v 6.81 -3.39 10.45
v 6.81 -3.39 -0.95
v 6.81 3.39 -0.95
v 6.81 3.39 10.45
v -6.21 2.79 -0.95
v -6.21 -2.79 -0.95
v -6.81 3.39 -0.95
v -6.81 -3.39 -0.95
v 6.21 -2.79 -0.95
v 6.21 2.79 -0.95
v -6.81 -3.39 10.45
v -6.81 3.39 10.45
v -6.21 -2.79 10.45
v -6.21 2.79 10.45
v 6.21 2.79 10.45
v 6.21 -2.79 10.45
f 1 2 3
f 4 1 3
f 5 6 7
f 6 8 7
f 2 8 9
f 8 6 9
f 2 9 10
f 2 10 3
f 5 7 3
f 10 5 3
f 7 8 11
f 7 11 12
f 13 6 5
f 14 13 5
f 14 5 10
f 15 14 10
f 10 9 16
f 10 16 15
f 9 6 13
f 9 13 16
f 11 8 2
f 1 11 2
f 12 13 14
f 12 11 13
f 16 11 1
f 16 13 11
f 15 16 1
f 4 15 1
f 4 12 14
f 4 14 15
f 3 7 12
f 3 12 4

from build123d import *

# Parameters (mm, degrees)
SKETCH_1_W      = 11.35
SKETCH_1_H      = 5.65
SKETCH_1_W_2    = 10.35
SKETCH_1_H_2    = 4.65
EXTRUDE_1_DEPTH = 9.5
SCALE_1_SCALE   = 1.2


with BuildPart() as part:
    # 草图1 → 拉伸-薄壁1 (new body)
    with BuildSketch(Plane.XY):
        Rectangle(SKETCH_1_W, SKETCH_1_H)
        Rectangle(SKETCH_1_W_2, SKETCH_1_H_2, mode=Mode.SUBTRACT)
    extrude(amount=EXTRUDE_1_DEPTH)


with BuildPart() as part_1:
    # 缩放比例1: scaled about (0, 0, 4.75)
    add(part.part.scale(SCALE_1_SCALE).moved(Location((0, 0, -0.95))))


solid = part_1.part
